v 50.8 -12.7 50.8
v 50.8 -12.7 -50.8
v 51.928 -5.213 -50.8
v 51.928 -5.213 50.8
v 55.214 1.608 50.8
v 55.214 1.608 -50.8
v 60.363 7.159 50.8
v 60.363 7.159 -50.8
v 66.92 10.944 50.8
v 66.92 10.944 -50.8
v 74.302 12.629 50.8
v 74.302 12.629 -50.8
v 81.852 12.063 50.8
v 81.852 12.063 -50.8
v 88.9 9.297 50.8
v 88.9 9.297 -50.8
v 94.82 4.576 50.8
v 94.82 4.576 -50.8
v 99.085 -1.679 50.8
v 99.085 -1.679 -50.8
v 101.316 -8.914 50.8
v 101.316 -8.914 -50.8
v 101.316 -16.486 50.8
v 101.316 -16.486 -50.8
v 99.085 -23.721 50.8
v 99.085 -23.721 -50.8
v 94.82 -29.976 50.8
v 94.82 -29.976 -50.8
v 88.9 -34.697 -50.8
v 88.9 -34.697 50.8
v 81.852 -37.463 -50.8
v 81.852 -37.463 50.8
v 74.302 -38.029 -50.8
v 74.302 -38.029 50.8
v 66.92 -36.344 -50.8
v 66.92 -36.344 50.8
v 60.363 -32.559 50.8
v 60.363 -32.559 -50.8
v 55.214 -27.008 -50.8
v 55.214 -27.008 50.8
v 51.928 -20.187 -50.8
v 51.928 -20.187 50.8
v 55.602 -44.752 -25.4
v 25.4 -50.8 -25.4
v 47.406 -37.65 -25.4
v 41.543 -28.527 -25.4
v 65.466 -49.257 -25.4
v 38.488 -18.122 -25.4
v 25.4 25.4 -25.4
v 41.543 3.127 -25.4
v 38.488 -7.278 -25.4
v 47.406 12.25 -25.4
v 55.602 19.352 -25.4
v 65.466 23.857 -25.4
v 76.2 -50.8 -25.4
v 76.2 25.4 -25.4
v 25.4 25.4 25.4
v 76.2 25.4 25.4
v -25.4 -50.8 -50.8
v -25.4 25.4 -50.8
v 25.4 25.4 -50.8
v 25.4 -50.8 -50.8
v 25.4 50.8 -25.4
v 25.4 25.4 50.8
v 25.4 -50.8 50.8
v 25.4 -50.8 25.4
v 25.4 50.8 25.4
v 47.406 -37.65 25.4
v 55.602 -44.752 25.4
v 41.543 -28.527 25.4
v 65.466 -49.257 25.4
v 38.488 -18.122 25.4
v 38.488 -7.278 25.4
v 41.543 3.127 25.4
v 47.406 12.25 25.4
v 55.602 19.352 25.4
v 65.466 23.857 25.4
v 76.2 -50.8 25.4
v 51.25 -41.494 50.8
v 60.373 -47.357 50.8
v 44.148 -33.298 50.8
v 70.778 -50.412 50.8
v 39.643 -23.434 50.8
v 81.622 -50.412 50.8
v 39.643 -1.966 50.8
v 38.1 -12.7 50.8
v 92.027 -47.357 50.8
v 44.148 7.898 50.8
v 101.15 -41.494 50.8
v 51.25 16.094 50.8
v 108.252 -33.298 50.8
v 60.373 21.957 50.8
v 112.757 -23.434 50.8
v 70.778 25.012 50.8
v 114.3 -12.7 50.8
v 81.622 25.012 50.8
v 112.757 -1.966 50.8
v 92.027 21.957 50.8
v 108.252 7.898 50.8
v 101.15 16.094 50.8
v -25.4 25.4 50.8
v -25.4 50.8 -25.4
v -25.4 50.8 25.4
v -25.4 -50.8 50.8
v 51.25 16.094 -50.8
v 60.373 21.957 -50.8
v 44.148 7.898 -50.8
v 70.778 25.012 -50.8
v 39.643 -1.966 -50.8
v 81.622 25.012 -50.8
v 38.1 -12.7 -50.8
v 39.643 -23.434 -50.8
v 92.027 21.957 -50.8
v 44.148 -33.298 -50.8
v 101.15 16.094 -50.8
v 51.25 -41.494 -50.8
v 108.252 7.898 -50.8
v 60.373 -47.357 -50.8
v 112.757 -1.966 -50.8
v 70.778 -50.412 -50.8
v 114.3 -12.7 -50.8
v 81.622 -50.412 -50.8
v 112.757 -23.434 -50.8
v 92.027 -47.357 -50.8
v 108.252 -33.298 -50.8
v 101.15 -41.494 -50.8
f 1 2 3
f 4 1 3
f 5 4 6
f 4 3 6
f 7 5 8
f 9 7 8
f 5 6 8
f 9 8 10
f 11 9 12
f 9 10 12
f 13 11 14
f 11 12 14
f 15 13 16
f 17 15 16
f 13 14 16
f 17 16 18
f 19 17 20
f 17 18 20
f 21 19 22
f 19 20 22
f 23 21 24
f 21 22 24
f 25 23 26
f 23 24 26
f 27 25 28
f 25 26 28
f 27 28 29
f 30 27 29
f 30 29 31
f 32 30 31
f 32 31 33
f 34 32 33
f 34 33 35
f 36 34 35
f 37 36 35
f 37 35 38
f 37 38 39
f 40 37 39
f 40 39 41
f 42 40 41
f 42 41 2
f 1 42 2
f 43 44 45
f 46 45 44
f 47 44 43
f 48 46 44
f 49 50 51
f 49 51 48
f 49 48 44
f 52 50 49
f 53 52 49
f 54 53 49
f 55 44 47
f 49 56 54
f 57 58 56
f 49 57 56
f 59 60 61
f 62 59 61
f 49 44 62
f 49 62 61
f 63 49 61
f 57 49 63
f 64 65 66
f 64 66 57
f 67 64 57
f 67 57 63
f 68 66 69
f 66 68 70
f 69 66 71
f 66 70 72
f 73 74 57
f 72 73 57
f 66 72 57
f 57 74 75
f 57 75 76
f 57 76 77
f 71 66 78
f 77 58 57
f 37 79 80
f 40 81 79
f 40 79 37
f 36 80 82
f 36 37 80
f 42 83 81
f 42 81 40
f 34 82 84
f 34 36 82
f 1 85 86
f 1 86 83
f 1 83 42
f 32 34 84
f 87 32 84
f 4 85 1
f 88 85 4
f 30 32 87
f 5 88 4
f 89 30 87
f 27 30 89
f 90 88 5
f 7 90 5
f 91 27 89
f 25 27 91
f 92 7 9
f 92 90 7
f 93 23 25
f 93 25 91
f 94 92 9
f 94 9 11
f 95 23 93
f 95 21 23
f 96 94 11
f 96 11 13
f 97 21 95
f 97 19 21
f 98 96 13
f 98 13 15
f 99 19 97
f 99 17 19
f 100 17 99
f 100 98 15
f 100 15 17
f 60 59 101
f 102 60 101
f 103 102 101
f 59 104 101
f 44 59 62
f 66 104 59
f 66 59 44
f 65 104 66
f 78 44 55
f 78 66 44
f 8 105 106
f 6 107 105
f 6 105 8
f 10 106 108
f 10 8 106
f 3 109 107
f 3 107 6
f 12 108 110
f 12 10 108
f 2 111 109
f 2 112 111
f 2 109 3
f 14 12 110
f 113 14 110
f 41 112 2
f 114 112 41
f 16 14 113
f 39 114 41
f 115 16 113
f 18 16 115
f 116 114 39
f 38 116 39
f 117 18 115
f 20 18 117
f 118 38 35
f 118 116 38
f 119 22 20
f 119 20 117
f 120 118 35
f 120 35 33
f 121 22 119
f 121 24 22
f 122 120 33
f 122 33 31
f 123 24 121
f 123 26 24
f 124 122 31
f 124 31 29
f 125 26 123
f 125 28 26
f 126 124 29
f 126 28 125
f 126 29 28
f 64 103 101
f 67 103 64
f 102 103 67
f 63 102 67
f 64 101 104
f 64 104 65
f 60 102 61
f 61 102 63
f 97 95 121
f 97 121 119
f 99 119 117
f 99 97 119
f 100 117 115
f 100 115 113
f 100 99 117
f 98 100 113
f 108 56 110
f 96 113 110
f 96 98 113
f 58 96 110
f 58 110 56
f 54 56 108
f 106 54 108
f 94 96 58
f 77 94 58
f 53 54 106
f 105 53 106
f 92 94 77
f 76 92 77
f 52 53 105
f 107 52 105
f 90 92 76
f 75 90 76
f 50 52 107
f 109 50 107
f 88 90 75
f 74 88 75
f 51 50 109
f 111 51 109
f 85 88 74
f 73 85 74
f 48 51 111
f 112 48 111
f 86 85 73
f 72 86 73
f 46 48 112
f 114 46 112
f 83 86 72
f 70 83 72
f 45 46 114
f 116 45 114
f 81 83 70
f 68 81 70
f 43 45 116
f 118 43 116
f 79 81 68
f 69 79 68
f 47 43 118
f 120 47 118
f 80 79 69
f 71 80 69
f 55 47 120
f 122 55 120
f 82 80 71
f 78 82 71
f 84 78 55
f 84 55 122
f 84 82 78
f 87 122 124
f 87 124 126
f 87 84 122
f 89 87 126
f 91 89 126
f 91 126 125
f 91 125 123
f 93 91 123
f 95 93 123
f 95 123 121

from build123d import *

# Parameters (mm, degrees)
SKETCH2_W           = 50.8
SKETCH2_H           = 101.6
BOSS_EXTRUDE1_DEPTH = 50.8
SKETCH3_W           = 50.8
SKETCH3_H           = 76.2
BOSS_EXTRUDE2_DEPTH = 50.8
BOSS_EXTRUDE3_REACH = 138.783
SKETCH4_R           = 38.1
CHAMFER2_SIZE       = 25.4
HOLE1_D             = 50.8


with BuildPart() as part:
    # Sketch2 → Boss-Extrude1 (new, symmetric)
    with BuildSketch(Plane.XY):
        Rectangle(SKETCH2_W, SKETCH2_H)
    extrude(amount=BOSS_EXTRUDE1_DEPTH, both=True)

    # Sketch3 → Boss-Extrude2 (add)
    with BuildSketch(Plane(origin=(76.2, 0, 0), x_dir=(0, 0, -1), z_dir=(1, 0, 0))):
        with Locations((0, -12.7)):
            Rectangle(SKETCH3_W, SKETCH3_H)
    extrude(amount=-BOSS_EXTRUDE2_DEPTH)

    # Boss-Extrude3: up to this face of the body (flat: up to its plane)
    boss_extrude3_end = Plane(part.part.faces().sort_by_distance((0, 0, -50.8))[0])
    # Sketch4 → Boss-Extrude3 (add, up to the picked face)
    with BuildSketch(Plane.XY.offset(50.8), mode=Mode.PRIVATE) as boss_extrude3_sk1:
        with Locations((76.2, -12.7)):
            Circle(SKETCH4_R)
    boss_extrude3_tool1 = split(extrude(boss_extrude3_sk1.sketch, amount=-BOSS_EXTRUDE3_REACH, mode=Mode.PRIVATE), bisect_by=boss_extrude3_end, keep=Keep.BOTH, mode=Mode.PRIVATE)
    add(boss_extrude3_tool1.solids().sort_by(Axis((76.2, -12.7, 50.8), (0, 0, -1)))[0])

    # Chamfer2
    chamfer2_edges = [part.edges().sort_by_distance(p)[0] for p in [
        (0, 50.8, -50.8),
        (0, 50.8, 50.8),
    ]]
    chamfer(chamfer2_edges, length=CHAMFER2_SIZE)

    # Hole1 (through all)
    with Locations(Plane(origin=(76.2, -12.7, 50.8), x_dir=(1, 0, 0), z_dir=(0, 0, 1))):
        with Locations((0, 0)):
            Hole(HOLE1_D / 2)


solid = part.part
